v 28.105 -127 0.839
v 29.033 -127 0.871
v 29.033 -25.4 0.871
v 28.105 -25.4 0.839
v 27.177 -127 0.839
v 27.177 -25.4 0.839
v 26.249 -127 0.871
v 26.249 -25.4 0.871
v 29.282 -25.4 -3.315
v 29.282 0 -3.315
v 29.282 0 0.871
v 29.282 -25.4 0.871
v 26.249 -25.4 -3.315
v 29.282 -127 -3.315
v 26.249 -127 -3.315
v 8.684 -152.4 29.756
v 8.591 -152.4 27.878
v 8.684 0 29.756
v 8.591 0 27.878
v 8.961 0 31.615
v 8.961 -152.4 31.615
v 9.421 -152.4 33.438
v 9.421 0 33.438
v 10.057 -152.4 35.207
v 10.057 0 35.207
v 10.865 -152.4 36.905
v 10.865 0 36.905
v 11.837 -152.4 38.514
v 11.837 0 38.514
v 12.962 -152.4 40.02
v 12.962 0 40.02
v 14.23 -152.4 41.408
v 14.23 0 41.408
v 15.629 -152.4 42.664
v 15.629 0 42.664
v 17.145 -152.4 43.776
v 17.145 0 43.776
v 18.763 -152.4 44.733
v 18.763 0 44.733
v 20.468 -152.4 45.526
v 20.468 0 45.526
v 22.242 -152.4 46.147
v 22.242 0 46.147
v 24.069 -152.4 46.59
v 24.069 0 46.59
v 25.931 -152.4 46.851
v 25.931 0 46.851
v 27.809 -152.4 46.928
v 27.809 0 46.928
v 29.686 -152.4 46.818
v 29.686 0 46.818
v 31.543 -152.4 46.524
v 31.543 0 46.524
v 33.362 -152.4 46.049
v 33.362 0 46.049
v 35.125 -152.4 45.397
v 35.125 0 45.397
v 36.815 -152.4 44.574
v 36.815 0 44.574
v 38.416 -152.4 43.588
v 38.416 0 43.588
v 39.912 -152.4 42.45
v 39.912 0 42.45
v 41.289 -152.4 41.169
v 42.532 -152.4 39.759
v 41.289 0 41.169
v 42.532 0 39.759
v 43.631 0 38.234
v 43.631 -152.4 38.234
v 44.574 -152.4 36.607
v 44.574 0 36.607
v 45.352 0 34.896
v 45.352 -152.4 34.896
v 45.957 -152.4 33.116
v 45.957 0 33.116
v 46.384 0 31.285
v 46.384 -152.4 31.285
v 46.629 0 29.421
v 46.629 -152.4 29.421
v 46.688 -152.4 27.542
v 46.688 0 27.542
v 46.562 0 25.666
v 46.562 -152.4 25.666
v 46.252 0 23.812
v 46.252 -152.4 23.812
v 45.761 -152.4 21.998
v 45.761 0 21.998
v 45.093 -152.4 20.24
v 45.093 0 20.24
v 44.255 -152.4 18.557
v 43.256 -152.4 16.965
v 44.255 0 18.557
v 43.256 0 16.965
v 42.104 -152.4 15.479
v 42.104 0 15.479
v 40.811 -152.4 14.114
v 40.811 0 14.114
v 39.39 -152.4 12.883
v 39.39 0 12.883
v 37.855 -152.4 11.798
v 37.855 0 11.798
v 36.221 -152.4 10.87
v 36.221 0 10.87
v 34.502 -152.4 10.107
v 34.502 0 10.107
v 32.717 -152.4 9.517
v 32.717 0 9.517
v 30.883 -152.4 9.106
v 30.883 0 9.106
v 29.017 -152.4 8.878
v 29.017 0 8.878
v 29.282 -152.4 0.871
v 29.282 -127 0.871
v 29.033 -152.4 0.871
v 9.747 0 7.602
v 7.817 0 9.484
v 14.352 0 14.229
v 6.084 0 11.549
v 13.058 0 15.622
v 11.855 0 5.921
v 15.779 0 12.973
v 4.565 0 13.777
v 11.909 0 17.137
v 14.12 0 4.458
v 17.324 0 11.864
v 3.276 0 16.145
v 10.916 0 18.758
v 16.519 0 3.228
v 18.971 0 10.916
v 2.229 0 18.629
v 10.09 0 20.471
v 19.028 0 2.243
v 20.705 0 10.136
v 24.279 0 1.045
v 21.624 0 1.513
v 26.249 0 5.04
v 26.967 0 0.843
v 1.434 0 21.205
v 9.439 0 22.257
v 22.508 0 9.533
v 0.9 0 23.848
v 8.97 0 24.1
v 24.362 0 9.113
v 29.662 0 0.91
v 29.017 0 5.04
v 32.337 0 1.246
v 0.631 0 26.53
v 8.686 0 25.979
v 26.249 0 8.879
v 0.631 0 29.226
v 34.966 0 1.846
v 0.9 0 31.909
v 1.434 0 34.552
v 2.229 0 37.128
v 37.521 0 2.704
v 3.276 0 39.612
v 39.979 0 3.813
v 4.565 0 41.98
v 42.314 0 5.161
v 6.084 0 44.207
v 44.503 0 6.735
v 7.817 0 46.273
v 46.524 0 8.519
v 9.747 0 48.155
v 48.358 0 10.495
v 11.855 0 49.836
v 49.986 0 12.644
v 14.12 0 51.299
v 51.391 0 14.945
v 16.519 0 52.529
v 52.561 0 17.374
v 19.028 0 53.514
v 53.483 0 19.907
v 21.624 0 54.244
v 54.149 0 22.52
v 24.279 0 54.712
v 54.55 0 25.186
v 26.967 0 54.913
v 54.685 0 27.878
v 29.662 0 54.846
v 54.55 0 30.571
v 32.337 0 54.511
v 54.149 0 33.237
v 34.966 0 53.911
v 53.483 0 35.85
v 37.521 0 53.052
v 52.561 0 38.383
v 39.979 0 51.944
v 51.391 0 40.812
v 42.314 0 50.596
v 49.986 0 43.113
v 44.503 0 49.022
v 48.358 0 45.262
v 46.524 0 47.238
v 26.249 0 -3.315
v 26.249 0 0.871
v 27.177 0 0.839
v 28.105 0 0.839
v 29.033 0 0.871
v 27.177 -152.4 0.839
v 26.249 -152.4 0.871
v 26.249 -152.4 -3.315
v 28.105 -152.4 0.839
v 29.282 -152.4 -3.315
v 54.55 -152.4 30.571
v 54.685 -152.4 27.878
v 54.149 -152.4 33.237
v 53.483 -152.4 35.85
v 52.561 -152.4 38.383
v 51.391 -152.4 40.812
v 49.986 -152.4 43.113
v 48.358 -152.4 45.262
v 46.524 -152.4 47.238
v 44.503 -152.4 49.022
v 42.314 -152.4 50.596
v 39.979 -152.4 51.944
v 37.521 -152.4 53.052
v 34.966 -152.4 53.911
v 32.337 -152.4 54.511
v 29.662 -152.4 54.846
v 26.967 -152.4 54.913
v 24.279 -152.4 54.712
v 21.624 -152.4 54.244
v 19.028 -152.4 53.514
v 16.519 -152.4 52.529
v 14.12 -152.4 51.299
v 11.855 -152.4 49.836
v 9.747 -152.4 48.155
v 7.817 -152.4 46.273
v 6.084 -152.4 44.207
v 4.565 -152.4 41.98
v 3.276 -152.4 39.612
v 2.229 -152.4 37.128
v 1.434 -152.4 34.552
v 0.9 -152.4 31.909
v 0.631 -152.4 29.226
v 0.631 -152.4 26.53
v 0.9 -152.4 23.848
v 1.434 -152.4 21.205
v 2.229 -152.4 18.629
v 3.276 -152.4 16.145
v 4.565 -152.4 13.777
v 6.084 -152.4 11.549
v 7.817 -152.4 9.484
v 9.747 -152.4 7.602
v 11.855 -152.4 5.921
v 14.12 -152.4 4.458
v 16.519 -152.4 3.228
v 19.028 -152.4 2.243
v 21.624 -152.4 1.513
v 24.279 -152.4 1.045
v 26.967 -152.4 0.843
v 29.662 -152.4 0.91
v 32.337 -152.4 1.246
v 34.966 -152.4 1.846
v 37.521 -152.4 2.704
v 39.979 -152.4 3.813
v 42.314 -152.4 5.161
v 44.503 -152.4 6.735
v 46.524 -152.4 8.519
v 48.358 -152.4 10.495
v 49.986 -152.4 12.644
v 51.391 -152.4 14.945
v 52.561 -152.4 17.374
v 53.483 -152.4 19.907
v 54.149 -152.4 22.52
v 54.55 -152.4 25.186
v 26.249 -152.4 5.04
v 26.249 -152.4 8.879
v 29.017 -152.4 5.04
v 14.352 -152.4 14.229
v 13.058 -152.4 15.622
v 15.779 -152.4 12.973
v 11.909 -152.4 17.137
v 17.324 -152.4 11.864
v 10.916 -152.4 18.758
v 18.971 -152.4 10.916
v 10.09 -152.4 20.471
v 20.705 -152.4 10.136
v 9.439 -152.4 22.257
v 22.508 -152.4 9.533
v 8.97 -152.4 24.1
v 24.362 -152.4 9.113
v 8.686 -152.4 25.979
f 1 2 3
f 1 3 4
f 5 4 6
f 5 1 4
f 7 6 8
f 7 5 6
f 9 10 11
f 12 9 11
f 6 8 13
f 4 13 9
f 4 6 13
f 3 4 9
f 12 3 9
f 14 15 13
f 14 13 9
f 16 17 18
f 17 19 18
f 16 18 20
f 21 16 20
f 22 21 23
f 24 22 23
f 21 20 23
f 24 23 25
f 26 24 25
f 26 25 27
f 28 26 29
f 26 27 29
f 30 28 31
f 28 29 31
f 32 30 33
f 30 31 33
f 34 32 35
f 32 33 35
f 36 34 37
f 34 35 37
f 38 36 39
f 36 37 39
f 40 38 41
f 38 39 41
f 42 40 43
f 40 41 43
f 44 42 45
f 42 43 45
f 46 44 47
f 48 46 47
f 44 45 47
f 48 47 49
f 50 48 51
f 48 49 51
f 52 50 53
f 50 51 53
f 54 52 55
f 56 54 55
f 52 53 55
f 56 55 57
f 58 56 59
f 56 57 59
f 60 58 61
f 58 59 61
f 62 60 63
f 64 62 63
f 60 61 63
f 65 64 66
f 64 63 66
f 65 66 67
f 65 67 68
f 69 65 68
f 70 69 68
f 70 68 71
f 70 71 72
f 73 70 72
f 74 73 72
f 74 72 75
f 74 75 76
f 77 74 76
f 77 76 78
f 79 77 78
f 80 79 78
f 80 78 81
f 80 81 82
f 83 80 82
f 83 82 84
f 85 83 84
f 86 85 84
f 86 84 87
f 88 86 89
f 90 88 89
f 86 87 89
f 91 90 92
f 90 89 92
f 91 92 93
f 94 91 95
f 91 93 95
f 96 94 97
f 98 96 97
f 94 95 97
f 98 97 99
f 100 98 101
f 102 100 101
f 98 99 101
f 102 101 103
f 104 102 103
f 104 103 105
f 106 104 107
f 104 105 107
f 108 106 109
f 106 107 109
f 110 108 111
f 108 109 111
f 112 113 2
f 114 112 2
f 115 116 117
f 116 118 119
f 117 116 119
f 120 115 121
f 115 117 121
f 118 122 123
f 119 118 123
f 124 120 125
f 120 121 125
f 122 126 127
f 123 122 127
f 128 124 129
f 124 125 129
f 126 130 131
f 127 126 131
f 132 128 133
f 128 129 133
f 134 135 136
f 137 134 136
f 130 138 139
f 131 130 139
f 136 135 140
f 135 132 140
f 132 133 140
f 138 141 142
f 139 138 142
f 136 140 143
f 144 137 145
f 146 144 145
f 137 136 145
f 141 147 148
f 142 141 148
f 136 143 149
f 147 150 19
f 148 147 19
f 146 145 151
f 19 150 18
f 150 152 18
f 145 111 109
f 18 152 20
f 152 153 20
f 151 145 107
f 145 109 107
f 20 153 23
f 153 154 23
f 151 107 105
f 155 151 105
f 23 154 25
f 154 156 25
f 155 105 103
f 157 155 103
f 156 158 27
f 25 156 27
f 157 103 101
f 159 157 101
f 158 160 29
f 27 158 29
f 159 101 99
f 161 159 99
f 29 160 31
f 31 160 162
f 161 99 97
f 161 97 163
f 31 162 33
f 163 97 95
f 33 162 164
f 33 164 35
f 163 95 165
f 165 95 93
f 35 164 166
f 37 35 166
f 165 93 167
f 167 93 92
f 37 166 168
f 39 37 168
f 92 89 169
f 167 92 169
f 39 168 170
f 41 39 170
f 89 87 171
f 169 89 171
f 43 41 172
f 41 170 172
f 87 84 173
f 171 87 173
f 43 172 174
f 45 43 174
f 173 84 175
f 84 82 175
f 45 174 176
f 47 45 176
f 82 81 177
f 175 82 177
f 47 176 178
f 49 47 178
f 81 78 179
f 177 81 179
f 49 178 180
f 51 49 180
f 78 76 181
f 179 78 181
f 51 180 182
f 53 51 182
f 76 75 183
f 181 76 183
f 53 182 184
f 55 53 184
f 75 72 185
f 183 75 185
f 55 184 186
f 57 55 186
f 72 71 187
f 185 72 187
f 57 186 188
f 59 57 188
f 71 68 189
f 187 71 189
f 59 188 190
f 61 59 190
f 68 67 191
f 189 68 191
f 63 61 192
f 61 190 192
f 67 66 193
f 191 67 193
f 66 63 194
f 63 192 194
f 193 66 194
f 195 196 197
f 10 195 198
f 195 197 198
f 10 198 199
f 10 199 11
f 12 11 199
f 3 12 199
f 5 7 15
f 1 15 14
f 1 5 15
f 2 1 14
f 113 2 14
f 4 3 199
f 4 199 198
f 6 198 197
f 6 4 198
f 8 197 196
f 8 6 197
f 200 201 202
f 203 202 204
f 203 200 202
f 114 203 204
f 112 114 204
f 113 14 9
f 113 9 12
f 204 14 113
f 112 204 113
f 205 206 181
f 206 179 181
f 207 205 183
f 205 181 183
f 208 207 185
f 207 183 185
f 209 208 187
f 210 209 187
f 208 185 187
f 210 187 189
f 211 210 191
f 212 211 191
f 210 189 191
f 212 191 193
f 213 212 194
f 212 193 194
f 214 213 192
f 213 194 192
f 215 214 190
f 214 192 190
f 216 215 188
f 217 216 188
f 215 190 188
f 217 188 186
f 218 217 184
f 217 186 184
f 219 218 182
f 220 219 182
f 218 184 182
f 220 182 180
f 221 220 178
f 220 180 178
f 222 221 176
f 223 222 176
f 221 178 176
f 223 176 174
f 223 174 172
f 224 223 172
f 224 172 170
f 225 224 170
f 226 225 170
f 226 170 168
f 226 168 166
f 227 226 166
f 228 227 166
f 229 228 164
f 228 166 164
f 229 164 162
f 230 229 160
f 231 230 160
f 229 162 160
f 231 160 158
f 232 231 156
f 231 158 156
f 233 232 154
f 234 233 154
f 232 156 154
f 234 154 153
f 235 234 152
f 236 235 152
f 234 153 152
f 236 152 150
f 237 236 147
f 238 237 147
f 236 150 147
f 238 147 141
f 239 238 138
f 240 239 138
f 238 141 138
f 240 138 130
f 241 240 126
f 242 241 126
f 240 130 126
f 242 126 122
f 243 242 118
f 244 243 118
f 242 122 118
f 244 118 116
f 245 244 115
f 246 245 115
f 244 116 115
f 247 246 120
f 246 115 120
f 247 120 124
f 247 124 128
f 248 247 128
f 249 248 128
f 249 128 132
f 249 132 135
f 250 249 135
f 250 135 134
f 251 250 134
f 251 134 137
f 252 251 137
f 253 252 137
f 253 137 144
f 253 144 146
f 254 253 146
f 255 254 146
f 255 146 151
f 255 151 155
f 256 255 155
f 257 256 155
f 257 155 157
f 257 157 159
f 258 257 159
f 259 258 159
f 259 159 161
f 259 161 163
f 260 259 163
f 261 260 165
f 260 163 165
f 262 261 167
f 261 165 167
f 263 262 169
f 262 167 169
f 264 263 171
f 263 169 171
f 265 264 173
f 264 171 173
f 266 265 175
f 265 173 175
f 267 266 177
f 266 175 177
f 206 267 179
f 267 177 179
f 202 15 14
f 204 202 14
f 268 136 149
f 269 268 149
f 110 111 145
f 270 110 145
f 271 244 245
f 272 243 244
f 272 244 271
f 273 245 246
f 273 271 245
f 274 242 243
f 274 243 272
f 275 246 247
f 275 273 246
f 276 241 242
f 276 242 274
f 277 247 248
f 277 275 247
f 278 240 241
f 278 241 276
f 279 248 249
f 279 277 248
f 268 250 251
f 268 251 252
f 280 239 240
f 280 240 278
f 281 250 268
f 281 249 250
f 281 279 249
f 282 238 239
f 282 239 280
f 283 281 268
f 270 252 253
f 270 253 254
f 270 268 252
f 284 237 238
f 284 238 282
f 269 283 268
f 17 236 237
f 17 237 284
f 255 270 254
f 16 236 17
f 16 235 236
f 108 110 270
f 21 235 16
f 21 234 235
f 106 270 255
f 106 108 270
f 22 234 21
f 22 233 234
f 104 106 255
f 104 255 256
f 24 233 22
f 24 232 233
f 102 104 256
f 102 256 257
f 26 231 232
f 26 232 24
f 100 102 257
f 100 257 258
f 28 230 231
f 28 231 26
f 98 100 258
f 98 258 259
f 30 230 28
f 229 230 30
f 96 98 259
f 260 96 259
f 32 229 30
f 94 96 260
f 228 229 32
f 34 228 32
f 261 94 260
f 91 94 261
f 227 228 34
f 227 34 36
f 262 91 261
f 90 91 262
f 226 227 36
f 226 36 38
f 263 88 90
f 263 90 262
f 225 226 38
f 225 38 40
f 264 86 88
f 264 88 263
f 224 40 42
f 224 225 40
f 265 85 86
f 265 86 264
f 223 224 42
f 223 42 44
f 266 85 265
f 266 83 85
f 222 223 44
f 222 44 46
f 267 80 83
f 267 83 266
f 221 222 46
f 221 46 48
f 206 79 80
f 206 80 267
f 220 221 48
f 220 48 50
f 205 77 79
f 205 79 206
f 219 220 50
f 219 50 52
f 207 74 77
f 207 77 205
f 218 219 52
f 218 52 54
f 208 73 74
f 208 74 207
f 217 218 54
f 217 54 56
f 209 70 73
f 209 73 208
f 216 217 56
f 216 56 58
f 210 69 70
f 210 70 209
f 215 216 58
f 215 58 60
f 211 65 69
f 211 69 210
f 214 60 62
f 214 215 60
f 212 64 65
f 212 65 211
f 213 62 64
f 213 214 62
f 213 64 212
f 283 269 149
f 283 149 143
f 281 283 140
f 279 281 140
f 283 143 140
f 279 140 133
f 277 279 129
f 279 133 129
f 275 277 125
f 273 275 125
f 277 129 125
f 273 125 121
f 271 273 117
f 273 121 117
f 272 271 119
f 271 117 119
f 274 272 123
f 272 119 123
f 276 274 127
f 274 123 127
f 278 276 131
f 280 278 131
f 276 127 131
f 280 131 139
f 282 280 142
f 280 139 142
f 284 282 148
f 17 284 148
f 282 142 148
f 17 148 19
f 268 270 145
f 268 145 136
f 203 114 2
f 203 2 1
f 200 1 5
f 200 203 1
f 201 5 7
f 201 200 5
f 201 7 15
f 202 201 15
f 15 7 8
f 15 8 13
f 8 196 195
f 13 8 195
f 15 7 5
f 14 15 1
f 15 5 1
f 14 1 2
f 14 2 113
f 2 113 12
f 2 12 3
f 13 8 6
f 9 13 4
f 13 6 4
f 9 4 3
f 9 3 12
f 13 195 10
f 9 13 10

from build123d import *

# Parameters (mm, degrees)
F0_R      = 27.0435400324
F1_DEPTH  = 25.4
F3_D      = 38.1
F5_DEPTH  = 25.4
F6_DEPTH  = 127
F8_DEPTH  = 25.4
F9_DEPTH  = 101.6
F10_DEPTH = 25.4


with BuildPart() as f1:
    # F0 (on Front) → F1 (new body)
    with BuildSketch(Plane.XZ):
        with Locations((27.6412703097, 27.8783403337)):
            Circle(F0_R)
    extrude(amount=F1_DEPTH)

    # F3 (through all)
    with Locations(Plane.XZ.offset(25.4)):
        with Locations((27.6412703097, 27.8783403337)):
            Hole(F3_D / 2)

    # F4 (on face) → F5 (cut)
    with BuildSketch(Plane(origin=(0, 0, 0), x_dir=(-1, 0, 0), z_dir=(0, 1, 0))):
        with BuildLine():
            Line((-26.2493573993, 5.0403885543), (-26.2493573993, 8.8792593441))
            ThreePointArc((-26.2493573993, 8.8792593441), (-27.6329506683, 8.8283421504), (-29.0165878832, 8.8780508209))
            Line((-29.0165878832, 8.8780508209), (-29.0165878832, 5.0403885543))
            Line((-29.0165878832, 5.0403885543), (-26.2493573993, 5.0403885543))
        make_face()
    extrude(amount=-F5_DEPTH, mode=Mode.SUBTRACT)

    # F6 (add): a face of the model
    f6_faces = [f1.faces().sort_by_distance(p)[0] for p in [
        (1.362637099, -25.4, 27.8783403337),
    ]]
    extrude(f6_faces, amount=F6_DEPTH)


with BuildPart() as f8:
    # F7 (on face) → F8 (new body)
    with BuildSketch(Plane.XZ.offset(152.4)):
        with BuildLine():
            ThreePointArc((29.0331832201, 0.8706444687), (27.6412703097, 0.8348003013), (26.2493573993, 0.8706444687))
            Line((26.2493573993, 0.8706444687), (26.2493573993, -3.3151728567))
            Line((26.2493573993, -3.3151728567), (29.2821917683, -3.3151728567))
            Line((29.2821917683, -3.3151728567), (29.2821917683, 0.8706444687))
            Line((29.2821917683, 0.8706444687), (29.0331832201, 0.8706444687))
        make_face()
    extrude(amount=-F8_DEPTH)


with BuildPart() as f9:
    # F9 (new): a face of the model
    f9_faces = [f8.part.faces().sort_by_distance(p)[0] for p in [
        (27.766430524, -127, -1.2332149639),
    ]]
    extrude(f9_faces, amount=F9_DEPTH)


with BuildPart() as f10:
    # F10 (new): a face of the model
    f10_faces = [f9.part.faces().sort_by_distance(p)[0] for p in [
        (27.766430524, -25.4, -1.2332149639),
    ]]
    extrude(f10_faces, amount=F10_DEPTH)


solid = Compound([f1.part, f8.part, f9.part, f10.part])
